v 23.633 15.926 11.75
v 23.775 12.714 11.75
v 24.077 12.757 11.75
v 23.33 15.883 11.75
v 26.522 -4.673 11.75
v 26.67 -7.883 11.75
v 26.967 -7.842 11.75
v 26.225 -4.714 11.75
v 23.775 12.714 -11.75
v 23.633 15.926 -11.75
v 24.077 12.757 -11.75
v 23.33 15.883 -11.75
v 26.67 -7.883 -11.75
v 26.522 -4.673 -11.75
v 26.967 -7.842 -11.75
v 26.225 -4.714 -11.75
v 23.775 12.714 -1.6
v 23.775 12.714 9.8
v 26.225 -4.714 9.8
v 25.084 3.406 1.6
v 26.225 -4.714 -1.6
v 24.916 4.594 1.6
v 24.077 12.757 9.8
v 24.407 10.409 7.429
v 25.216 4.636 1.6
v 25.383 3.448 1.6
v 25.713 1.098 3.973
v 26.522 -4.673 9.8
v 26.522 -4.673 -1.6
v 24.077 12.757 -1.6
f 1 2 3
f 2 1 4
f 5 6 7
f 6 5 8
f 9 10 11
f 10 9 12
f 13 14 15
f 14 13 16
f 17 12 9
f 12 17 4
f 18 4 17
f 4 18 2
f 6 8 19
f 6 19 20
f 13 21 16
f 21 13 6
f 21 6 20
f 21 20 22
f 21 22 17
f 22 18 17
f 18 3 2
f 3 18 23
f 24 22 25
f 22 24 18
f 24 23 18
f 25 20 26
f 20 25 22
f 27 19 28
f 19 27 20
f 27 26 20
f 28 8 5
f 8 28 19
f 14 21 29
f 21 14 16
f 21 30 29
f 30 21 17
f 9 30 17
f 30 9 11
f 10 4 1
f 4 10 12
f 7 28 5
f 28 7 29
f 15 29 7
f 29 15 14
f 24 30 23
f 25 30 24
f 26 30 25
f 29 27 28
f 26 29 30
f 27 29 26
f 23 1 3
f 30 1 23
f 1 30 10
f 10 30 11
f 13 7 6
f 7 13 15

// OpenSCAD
use <../foots.scad>
use <robot_foot.scad>
use <../vptc_roller.scad>
$fn=64;
check="cuff";
module verification_layout(){
 rigid_foot();
 translate([0,0,60])soft_sole();
 translate([0,0,120])connector_reference();
 translate([0,0,180])translate([-47,0,0])rotate([180,180,0])shin(foot=false);
 translate([0,0,240])integrated_foot();
 translate([0,0,300])intersection(){connector_reference();rigid_foot();}
 translate([0,0,360])intersection(){rigid_foot();translate([-47,0,0])rotate([180,180,0])shin(foot=false);}
 translate([0,0,420])intersection(){rigid_foot();soft_sole();}
 translate([0,0,480])intersection(){integrated_foot();translate([-47,0,0])rotate([180,180,0])shin(foot=false);}
 translate([0,0,540])intersection(){integrated_foot();foot_joint_socket();}
 translate([0,0,600])intersection(){integrated_foot();cylinder(h=25,d=4.2,center=true,$fn=80);}
 translate([0,0,660])intersection(){translate([-47,0,0])rotate([180,180,0])shin(foot=false);foot_joint_trim();}
 translate([0,0,720])foot_joint_socket();
}
if(check=="all")verification_layout();
else if(check=="cuff") intersection(){rigid_foot();connector_reference();}
else if(check=="shin") intersection(){rigid_foot();translate([-47,0,0])rotate([180,180,0])shin(foot=false);}
else if(check=="sole") intersection(){rigid_foot();soft_sole();}
else if(check=="reference") connector_reference();
else if(check=="original_shin") translate([-47,0,0])rotate([180,180,0])shin(foot=false);
else if(check=="joined") union(){connector_reference();rigid_foot();}
